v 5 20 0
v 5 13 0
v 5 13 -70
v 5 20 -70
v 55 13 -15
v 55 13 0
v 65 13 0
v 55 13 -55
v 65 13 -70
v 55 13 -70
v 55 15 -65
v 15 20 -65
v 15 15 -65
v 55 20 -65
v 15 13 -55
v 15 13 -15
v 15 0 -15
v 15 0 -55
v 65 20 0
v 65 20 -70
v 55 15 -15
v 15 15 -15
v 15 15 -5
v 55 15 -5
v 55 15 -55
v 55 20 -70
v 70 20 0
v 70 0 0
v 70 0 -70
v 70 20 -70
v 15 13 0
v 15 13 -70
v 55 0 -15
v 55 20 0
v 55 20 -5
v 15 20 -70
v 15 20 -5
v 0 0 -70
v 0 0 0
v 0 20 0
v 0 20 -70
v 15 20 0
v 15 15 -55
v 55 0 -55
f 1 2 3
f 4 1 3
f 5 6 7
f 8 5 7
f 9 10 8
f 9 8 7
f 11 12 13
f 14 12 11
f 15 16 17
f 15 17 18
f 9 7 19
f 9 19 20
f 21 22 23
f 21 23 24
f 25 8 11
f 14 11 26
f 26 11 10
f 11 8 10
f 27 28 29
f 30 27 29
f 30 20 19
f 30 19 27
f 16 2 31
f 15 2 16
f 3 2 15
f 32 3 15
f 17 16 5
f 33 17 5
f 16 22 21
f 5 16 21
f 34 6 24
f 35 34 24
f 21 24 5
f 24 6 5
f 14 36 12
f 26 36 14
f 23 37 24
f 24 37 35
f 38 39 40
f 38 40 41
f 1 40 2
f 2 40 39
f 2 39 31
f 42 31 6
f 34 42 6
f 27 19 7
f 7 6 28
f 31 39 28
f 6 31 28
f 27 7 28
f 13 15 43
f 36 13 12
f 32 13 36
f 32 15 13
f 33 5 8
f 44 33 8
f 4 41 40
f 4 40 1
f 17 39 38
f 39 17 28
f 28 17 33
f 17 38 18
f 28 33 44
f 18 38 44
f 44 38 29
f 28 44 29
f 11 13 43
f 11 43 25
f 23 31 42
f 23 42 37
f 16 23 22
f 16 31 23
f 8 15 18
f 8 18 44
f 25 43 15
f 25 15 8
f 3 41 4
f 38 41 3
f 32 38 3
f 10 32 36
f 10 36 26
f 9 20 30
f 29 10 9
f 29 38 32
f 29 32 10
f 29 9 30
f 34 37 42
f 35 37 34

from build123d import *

# Parameters (mm, degrees)
CROQUIS1_W                 = 70
CROQUIS1_H                 = 70
SALIENTE_EXTRUIR1_DEPTH    = 20
CROQUIS2_W                 = 60
CROQUIS2_H                 = 60
CORTAR_EXTRUIR1_DEPTH      = 5
CORTAR_EXTRUIR2_DEPTH      = 5
CORTAR_EXTRUIR2_DEPTH_BACK = 2
CROQUIS3_W                 = 10
CROQUIS3_H                 = 70
CROQUIS4_W                 = 40
CROQUIS4_H                 = 40
CORTAR_EXTRUIR3_DEPTH      = 52


with BuildPart() as part:
    # Croquis1 → Saliente-Extruir1 (new body)
    with BuildSketch(Plane(origin=(0, 0, 0), x_dir=(1, 0, 0), z_dir=(0, 1, 0))):
        with Locations((35, 35)):
            Rectangle(CROQUIS1_W, CROQUIS1_H)
    extrude(amount=SALIENTE_EXTRUIR1_DEPTH)

    # Croquis2 → Cortar-Extruir1 (cut)
    with BuildSketch(Plane(origin=(0, 20, 0), x_dir=(1, 0, 0), z_dir=(0, 1, 0))):
        with Locations((35, 35)):
            Rectangle(CROQUIS2_W, CROQUIS2_H)
    extrude(amount=-CORTAR_EXTRUIR1_DEPTH, mode=Mode.SUBTRACT)

    # Croquis3 → Cortar-Extruir2 (cut, two sides: drawn at the far end of the back side and taken through both)
    with BuildSketch(Plane(origin=(0, 15, 0), x_dir=(1, 0, 0), z_dir=(0, 1, 0)).offset(-CORTAR_EXTRUIR2_DEPTH_BACK)):
        with Locations((10, 35)):
            Rectangle(CROQUIS3_W, CROQUIS3_H)
        with Locations((60, 35)):
            Rectangle(CROQUIS3_W, CROQUIS3_H)
    extrude(amount=CORTAR_EXTRUIR2_DEPTH + CORTAR_EXTRUIR2_DEPTH_BACK, mode=Mode.SUBTRACT)

    # Croquis4 → Cortar-Extruir3 (cut)
    with BuildSketch(Plane(origin=(0, 15, 0), x_dir=(1, 0, 0), z_dir=(0, 1, 0))):
        with Locations((35, 35)):
            Rectangle(CROQUIS4_W, CROQUIS4_H)
    extrude(amount=-CORTAR_EXTRUIR3_DEPTH, mode=Mode.SUBTRACT)


solid = part.part
